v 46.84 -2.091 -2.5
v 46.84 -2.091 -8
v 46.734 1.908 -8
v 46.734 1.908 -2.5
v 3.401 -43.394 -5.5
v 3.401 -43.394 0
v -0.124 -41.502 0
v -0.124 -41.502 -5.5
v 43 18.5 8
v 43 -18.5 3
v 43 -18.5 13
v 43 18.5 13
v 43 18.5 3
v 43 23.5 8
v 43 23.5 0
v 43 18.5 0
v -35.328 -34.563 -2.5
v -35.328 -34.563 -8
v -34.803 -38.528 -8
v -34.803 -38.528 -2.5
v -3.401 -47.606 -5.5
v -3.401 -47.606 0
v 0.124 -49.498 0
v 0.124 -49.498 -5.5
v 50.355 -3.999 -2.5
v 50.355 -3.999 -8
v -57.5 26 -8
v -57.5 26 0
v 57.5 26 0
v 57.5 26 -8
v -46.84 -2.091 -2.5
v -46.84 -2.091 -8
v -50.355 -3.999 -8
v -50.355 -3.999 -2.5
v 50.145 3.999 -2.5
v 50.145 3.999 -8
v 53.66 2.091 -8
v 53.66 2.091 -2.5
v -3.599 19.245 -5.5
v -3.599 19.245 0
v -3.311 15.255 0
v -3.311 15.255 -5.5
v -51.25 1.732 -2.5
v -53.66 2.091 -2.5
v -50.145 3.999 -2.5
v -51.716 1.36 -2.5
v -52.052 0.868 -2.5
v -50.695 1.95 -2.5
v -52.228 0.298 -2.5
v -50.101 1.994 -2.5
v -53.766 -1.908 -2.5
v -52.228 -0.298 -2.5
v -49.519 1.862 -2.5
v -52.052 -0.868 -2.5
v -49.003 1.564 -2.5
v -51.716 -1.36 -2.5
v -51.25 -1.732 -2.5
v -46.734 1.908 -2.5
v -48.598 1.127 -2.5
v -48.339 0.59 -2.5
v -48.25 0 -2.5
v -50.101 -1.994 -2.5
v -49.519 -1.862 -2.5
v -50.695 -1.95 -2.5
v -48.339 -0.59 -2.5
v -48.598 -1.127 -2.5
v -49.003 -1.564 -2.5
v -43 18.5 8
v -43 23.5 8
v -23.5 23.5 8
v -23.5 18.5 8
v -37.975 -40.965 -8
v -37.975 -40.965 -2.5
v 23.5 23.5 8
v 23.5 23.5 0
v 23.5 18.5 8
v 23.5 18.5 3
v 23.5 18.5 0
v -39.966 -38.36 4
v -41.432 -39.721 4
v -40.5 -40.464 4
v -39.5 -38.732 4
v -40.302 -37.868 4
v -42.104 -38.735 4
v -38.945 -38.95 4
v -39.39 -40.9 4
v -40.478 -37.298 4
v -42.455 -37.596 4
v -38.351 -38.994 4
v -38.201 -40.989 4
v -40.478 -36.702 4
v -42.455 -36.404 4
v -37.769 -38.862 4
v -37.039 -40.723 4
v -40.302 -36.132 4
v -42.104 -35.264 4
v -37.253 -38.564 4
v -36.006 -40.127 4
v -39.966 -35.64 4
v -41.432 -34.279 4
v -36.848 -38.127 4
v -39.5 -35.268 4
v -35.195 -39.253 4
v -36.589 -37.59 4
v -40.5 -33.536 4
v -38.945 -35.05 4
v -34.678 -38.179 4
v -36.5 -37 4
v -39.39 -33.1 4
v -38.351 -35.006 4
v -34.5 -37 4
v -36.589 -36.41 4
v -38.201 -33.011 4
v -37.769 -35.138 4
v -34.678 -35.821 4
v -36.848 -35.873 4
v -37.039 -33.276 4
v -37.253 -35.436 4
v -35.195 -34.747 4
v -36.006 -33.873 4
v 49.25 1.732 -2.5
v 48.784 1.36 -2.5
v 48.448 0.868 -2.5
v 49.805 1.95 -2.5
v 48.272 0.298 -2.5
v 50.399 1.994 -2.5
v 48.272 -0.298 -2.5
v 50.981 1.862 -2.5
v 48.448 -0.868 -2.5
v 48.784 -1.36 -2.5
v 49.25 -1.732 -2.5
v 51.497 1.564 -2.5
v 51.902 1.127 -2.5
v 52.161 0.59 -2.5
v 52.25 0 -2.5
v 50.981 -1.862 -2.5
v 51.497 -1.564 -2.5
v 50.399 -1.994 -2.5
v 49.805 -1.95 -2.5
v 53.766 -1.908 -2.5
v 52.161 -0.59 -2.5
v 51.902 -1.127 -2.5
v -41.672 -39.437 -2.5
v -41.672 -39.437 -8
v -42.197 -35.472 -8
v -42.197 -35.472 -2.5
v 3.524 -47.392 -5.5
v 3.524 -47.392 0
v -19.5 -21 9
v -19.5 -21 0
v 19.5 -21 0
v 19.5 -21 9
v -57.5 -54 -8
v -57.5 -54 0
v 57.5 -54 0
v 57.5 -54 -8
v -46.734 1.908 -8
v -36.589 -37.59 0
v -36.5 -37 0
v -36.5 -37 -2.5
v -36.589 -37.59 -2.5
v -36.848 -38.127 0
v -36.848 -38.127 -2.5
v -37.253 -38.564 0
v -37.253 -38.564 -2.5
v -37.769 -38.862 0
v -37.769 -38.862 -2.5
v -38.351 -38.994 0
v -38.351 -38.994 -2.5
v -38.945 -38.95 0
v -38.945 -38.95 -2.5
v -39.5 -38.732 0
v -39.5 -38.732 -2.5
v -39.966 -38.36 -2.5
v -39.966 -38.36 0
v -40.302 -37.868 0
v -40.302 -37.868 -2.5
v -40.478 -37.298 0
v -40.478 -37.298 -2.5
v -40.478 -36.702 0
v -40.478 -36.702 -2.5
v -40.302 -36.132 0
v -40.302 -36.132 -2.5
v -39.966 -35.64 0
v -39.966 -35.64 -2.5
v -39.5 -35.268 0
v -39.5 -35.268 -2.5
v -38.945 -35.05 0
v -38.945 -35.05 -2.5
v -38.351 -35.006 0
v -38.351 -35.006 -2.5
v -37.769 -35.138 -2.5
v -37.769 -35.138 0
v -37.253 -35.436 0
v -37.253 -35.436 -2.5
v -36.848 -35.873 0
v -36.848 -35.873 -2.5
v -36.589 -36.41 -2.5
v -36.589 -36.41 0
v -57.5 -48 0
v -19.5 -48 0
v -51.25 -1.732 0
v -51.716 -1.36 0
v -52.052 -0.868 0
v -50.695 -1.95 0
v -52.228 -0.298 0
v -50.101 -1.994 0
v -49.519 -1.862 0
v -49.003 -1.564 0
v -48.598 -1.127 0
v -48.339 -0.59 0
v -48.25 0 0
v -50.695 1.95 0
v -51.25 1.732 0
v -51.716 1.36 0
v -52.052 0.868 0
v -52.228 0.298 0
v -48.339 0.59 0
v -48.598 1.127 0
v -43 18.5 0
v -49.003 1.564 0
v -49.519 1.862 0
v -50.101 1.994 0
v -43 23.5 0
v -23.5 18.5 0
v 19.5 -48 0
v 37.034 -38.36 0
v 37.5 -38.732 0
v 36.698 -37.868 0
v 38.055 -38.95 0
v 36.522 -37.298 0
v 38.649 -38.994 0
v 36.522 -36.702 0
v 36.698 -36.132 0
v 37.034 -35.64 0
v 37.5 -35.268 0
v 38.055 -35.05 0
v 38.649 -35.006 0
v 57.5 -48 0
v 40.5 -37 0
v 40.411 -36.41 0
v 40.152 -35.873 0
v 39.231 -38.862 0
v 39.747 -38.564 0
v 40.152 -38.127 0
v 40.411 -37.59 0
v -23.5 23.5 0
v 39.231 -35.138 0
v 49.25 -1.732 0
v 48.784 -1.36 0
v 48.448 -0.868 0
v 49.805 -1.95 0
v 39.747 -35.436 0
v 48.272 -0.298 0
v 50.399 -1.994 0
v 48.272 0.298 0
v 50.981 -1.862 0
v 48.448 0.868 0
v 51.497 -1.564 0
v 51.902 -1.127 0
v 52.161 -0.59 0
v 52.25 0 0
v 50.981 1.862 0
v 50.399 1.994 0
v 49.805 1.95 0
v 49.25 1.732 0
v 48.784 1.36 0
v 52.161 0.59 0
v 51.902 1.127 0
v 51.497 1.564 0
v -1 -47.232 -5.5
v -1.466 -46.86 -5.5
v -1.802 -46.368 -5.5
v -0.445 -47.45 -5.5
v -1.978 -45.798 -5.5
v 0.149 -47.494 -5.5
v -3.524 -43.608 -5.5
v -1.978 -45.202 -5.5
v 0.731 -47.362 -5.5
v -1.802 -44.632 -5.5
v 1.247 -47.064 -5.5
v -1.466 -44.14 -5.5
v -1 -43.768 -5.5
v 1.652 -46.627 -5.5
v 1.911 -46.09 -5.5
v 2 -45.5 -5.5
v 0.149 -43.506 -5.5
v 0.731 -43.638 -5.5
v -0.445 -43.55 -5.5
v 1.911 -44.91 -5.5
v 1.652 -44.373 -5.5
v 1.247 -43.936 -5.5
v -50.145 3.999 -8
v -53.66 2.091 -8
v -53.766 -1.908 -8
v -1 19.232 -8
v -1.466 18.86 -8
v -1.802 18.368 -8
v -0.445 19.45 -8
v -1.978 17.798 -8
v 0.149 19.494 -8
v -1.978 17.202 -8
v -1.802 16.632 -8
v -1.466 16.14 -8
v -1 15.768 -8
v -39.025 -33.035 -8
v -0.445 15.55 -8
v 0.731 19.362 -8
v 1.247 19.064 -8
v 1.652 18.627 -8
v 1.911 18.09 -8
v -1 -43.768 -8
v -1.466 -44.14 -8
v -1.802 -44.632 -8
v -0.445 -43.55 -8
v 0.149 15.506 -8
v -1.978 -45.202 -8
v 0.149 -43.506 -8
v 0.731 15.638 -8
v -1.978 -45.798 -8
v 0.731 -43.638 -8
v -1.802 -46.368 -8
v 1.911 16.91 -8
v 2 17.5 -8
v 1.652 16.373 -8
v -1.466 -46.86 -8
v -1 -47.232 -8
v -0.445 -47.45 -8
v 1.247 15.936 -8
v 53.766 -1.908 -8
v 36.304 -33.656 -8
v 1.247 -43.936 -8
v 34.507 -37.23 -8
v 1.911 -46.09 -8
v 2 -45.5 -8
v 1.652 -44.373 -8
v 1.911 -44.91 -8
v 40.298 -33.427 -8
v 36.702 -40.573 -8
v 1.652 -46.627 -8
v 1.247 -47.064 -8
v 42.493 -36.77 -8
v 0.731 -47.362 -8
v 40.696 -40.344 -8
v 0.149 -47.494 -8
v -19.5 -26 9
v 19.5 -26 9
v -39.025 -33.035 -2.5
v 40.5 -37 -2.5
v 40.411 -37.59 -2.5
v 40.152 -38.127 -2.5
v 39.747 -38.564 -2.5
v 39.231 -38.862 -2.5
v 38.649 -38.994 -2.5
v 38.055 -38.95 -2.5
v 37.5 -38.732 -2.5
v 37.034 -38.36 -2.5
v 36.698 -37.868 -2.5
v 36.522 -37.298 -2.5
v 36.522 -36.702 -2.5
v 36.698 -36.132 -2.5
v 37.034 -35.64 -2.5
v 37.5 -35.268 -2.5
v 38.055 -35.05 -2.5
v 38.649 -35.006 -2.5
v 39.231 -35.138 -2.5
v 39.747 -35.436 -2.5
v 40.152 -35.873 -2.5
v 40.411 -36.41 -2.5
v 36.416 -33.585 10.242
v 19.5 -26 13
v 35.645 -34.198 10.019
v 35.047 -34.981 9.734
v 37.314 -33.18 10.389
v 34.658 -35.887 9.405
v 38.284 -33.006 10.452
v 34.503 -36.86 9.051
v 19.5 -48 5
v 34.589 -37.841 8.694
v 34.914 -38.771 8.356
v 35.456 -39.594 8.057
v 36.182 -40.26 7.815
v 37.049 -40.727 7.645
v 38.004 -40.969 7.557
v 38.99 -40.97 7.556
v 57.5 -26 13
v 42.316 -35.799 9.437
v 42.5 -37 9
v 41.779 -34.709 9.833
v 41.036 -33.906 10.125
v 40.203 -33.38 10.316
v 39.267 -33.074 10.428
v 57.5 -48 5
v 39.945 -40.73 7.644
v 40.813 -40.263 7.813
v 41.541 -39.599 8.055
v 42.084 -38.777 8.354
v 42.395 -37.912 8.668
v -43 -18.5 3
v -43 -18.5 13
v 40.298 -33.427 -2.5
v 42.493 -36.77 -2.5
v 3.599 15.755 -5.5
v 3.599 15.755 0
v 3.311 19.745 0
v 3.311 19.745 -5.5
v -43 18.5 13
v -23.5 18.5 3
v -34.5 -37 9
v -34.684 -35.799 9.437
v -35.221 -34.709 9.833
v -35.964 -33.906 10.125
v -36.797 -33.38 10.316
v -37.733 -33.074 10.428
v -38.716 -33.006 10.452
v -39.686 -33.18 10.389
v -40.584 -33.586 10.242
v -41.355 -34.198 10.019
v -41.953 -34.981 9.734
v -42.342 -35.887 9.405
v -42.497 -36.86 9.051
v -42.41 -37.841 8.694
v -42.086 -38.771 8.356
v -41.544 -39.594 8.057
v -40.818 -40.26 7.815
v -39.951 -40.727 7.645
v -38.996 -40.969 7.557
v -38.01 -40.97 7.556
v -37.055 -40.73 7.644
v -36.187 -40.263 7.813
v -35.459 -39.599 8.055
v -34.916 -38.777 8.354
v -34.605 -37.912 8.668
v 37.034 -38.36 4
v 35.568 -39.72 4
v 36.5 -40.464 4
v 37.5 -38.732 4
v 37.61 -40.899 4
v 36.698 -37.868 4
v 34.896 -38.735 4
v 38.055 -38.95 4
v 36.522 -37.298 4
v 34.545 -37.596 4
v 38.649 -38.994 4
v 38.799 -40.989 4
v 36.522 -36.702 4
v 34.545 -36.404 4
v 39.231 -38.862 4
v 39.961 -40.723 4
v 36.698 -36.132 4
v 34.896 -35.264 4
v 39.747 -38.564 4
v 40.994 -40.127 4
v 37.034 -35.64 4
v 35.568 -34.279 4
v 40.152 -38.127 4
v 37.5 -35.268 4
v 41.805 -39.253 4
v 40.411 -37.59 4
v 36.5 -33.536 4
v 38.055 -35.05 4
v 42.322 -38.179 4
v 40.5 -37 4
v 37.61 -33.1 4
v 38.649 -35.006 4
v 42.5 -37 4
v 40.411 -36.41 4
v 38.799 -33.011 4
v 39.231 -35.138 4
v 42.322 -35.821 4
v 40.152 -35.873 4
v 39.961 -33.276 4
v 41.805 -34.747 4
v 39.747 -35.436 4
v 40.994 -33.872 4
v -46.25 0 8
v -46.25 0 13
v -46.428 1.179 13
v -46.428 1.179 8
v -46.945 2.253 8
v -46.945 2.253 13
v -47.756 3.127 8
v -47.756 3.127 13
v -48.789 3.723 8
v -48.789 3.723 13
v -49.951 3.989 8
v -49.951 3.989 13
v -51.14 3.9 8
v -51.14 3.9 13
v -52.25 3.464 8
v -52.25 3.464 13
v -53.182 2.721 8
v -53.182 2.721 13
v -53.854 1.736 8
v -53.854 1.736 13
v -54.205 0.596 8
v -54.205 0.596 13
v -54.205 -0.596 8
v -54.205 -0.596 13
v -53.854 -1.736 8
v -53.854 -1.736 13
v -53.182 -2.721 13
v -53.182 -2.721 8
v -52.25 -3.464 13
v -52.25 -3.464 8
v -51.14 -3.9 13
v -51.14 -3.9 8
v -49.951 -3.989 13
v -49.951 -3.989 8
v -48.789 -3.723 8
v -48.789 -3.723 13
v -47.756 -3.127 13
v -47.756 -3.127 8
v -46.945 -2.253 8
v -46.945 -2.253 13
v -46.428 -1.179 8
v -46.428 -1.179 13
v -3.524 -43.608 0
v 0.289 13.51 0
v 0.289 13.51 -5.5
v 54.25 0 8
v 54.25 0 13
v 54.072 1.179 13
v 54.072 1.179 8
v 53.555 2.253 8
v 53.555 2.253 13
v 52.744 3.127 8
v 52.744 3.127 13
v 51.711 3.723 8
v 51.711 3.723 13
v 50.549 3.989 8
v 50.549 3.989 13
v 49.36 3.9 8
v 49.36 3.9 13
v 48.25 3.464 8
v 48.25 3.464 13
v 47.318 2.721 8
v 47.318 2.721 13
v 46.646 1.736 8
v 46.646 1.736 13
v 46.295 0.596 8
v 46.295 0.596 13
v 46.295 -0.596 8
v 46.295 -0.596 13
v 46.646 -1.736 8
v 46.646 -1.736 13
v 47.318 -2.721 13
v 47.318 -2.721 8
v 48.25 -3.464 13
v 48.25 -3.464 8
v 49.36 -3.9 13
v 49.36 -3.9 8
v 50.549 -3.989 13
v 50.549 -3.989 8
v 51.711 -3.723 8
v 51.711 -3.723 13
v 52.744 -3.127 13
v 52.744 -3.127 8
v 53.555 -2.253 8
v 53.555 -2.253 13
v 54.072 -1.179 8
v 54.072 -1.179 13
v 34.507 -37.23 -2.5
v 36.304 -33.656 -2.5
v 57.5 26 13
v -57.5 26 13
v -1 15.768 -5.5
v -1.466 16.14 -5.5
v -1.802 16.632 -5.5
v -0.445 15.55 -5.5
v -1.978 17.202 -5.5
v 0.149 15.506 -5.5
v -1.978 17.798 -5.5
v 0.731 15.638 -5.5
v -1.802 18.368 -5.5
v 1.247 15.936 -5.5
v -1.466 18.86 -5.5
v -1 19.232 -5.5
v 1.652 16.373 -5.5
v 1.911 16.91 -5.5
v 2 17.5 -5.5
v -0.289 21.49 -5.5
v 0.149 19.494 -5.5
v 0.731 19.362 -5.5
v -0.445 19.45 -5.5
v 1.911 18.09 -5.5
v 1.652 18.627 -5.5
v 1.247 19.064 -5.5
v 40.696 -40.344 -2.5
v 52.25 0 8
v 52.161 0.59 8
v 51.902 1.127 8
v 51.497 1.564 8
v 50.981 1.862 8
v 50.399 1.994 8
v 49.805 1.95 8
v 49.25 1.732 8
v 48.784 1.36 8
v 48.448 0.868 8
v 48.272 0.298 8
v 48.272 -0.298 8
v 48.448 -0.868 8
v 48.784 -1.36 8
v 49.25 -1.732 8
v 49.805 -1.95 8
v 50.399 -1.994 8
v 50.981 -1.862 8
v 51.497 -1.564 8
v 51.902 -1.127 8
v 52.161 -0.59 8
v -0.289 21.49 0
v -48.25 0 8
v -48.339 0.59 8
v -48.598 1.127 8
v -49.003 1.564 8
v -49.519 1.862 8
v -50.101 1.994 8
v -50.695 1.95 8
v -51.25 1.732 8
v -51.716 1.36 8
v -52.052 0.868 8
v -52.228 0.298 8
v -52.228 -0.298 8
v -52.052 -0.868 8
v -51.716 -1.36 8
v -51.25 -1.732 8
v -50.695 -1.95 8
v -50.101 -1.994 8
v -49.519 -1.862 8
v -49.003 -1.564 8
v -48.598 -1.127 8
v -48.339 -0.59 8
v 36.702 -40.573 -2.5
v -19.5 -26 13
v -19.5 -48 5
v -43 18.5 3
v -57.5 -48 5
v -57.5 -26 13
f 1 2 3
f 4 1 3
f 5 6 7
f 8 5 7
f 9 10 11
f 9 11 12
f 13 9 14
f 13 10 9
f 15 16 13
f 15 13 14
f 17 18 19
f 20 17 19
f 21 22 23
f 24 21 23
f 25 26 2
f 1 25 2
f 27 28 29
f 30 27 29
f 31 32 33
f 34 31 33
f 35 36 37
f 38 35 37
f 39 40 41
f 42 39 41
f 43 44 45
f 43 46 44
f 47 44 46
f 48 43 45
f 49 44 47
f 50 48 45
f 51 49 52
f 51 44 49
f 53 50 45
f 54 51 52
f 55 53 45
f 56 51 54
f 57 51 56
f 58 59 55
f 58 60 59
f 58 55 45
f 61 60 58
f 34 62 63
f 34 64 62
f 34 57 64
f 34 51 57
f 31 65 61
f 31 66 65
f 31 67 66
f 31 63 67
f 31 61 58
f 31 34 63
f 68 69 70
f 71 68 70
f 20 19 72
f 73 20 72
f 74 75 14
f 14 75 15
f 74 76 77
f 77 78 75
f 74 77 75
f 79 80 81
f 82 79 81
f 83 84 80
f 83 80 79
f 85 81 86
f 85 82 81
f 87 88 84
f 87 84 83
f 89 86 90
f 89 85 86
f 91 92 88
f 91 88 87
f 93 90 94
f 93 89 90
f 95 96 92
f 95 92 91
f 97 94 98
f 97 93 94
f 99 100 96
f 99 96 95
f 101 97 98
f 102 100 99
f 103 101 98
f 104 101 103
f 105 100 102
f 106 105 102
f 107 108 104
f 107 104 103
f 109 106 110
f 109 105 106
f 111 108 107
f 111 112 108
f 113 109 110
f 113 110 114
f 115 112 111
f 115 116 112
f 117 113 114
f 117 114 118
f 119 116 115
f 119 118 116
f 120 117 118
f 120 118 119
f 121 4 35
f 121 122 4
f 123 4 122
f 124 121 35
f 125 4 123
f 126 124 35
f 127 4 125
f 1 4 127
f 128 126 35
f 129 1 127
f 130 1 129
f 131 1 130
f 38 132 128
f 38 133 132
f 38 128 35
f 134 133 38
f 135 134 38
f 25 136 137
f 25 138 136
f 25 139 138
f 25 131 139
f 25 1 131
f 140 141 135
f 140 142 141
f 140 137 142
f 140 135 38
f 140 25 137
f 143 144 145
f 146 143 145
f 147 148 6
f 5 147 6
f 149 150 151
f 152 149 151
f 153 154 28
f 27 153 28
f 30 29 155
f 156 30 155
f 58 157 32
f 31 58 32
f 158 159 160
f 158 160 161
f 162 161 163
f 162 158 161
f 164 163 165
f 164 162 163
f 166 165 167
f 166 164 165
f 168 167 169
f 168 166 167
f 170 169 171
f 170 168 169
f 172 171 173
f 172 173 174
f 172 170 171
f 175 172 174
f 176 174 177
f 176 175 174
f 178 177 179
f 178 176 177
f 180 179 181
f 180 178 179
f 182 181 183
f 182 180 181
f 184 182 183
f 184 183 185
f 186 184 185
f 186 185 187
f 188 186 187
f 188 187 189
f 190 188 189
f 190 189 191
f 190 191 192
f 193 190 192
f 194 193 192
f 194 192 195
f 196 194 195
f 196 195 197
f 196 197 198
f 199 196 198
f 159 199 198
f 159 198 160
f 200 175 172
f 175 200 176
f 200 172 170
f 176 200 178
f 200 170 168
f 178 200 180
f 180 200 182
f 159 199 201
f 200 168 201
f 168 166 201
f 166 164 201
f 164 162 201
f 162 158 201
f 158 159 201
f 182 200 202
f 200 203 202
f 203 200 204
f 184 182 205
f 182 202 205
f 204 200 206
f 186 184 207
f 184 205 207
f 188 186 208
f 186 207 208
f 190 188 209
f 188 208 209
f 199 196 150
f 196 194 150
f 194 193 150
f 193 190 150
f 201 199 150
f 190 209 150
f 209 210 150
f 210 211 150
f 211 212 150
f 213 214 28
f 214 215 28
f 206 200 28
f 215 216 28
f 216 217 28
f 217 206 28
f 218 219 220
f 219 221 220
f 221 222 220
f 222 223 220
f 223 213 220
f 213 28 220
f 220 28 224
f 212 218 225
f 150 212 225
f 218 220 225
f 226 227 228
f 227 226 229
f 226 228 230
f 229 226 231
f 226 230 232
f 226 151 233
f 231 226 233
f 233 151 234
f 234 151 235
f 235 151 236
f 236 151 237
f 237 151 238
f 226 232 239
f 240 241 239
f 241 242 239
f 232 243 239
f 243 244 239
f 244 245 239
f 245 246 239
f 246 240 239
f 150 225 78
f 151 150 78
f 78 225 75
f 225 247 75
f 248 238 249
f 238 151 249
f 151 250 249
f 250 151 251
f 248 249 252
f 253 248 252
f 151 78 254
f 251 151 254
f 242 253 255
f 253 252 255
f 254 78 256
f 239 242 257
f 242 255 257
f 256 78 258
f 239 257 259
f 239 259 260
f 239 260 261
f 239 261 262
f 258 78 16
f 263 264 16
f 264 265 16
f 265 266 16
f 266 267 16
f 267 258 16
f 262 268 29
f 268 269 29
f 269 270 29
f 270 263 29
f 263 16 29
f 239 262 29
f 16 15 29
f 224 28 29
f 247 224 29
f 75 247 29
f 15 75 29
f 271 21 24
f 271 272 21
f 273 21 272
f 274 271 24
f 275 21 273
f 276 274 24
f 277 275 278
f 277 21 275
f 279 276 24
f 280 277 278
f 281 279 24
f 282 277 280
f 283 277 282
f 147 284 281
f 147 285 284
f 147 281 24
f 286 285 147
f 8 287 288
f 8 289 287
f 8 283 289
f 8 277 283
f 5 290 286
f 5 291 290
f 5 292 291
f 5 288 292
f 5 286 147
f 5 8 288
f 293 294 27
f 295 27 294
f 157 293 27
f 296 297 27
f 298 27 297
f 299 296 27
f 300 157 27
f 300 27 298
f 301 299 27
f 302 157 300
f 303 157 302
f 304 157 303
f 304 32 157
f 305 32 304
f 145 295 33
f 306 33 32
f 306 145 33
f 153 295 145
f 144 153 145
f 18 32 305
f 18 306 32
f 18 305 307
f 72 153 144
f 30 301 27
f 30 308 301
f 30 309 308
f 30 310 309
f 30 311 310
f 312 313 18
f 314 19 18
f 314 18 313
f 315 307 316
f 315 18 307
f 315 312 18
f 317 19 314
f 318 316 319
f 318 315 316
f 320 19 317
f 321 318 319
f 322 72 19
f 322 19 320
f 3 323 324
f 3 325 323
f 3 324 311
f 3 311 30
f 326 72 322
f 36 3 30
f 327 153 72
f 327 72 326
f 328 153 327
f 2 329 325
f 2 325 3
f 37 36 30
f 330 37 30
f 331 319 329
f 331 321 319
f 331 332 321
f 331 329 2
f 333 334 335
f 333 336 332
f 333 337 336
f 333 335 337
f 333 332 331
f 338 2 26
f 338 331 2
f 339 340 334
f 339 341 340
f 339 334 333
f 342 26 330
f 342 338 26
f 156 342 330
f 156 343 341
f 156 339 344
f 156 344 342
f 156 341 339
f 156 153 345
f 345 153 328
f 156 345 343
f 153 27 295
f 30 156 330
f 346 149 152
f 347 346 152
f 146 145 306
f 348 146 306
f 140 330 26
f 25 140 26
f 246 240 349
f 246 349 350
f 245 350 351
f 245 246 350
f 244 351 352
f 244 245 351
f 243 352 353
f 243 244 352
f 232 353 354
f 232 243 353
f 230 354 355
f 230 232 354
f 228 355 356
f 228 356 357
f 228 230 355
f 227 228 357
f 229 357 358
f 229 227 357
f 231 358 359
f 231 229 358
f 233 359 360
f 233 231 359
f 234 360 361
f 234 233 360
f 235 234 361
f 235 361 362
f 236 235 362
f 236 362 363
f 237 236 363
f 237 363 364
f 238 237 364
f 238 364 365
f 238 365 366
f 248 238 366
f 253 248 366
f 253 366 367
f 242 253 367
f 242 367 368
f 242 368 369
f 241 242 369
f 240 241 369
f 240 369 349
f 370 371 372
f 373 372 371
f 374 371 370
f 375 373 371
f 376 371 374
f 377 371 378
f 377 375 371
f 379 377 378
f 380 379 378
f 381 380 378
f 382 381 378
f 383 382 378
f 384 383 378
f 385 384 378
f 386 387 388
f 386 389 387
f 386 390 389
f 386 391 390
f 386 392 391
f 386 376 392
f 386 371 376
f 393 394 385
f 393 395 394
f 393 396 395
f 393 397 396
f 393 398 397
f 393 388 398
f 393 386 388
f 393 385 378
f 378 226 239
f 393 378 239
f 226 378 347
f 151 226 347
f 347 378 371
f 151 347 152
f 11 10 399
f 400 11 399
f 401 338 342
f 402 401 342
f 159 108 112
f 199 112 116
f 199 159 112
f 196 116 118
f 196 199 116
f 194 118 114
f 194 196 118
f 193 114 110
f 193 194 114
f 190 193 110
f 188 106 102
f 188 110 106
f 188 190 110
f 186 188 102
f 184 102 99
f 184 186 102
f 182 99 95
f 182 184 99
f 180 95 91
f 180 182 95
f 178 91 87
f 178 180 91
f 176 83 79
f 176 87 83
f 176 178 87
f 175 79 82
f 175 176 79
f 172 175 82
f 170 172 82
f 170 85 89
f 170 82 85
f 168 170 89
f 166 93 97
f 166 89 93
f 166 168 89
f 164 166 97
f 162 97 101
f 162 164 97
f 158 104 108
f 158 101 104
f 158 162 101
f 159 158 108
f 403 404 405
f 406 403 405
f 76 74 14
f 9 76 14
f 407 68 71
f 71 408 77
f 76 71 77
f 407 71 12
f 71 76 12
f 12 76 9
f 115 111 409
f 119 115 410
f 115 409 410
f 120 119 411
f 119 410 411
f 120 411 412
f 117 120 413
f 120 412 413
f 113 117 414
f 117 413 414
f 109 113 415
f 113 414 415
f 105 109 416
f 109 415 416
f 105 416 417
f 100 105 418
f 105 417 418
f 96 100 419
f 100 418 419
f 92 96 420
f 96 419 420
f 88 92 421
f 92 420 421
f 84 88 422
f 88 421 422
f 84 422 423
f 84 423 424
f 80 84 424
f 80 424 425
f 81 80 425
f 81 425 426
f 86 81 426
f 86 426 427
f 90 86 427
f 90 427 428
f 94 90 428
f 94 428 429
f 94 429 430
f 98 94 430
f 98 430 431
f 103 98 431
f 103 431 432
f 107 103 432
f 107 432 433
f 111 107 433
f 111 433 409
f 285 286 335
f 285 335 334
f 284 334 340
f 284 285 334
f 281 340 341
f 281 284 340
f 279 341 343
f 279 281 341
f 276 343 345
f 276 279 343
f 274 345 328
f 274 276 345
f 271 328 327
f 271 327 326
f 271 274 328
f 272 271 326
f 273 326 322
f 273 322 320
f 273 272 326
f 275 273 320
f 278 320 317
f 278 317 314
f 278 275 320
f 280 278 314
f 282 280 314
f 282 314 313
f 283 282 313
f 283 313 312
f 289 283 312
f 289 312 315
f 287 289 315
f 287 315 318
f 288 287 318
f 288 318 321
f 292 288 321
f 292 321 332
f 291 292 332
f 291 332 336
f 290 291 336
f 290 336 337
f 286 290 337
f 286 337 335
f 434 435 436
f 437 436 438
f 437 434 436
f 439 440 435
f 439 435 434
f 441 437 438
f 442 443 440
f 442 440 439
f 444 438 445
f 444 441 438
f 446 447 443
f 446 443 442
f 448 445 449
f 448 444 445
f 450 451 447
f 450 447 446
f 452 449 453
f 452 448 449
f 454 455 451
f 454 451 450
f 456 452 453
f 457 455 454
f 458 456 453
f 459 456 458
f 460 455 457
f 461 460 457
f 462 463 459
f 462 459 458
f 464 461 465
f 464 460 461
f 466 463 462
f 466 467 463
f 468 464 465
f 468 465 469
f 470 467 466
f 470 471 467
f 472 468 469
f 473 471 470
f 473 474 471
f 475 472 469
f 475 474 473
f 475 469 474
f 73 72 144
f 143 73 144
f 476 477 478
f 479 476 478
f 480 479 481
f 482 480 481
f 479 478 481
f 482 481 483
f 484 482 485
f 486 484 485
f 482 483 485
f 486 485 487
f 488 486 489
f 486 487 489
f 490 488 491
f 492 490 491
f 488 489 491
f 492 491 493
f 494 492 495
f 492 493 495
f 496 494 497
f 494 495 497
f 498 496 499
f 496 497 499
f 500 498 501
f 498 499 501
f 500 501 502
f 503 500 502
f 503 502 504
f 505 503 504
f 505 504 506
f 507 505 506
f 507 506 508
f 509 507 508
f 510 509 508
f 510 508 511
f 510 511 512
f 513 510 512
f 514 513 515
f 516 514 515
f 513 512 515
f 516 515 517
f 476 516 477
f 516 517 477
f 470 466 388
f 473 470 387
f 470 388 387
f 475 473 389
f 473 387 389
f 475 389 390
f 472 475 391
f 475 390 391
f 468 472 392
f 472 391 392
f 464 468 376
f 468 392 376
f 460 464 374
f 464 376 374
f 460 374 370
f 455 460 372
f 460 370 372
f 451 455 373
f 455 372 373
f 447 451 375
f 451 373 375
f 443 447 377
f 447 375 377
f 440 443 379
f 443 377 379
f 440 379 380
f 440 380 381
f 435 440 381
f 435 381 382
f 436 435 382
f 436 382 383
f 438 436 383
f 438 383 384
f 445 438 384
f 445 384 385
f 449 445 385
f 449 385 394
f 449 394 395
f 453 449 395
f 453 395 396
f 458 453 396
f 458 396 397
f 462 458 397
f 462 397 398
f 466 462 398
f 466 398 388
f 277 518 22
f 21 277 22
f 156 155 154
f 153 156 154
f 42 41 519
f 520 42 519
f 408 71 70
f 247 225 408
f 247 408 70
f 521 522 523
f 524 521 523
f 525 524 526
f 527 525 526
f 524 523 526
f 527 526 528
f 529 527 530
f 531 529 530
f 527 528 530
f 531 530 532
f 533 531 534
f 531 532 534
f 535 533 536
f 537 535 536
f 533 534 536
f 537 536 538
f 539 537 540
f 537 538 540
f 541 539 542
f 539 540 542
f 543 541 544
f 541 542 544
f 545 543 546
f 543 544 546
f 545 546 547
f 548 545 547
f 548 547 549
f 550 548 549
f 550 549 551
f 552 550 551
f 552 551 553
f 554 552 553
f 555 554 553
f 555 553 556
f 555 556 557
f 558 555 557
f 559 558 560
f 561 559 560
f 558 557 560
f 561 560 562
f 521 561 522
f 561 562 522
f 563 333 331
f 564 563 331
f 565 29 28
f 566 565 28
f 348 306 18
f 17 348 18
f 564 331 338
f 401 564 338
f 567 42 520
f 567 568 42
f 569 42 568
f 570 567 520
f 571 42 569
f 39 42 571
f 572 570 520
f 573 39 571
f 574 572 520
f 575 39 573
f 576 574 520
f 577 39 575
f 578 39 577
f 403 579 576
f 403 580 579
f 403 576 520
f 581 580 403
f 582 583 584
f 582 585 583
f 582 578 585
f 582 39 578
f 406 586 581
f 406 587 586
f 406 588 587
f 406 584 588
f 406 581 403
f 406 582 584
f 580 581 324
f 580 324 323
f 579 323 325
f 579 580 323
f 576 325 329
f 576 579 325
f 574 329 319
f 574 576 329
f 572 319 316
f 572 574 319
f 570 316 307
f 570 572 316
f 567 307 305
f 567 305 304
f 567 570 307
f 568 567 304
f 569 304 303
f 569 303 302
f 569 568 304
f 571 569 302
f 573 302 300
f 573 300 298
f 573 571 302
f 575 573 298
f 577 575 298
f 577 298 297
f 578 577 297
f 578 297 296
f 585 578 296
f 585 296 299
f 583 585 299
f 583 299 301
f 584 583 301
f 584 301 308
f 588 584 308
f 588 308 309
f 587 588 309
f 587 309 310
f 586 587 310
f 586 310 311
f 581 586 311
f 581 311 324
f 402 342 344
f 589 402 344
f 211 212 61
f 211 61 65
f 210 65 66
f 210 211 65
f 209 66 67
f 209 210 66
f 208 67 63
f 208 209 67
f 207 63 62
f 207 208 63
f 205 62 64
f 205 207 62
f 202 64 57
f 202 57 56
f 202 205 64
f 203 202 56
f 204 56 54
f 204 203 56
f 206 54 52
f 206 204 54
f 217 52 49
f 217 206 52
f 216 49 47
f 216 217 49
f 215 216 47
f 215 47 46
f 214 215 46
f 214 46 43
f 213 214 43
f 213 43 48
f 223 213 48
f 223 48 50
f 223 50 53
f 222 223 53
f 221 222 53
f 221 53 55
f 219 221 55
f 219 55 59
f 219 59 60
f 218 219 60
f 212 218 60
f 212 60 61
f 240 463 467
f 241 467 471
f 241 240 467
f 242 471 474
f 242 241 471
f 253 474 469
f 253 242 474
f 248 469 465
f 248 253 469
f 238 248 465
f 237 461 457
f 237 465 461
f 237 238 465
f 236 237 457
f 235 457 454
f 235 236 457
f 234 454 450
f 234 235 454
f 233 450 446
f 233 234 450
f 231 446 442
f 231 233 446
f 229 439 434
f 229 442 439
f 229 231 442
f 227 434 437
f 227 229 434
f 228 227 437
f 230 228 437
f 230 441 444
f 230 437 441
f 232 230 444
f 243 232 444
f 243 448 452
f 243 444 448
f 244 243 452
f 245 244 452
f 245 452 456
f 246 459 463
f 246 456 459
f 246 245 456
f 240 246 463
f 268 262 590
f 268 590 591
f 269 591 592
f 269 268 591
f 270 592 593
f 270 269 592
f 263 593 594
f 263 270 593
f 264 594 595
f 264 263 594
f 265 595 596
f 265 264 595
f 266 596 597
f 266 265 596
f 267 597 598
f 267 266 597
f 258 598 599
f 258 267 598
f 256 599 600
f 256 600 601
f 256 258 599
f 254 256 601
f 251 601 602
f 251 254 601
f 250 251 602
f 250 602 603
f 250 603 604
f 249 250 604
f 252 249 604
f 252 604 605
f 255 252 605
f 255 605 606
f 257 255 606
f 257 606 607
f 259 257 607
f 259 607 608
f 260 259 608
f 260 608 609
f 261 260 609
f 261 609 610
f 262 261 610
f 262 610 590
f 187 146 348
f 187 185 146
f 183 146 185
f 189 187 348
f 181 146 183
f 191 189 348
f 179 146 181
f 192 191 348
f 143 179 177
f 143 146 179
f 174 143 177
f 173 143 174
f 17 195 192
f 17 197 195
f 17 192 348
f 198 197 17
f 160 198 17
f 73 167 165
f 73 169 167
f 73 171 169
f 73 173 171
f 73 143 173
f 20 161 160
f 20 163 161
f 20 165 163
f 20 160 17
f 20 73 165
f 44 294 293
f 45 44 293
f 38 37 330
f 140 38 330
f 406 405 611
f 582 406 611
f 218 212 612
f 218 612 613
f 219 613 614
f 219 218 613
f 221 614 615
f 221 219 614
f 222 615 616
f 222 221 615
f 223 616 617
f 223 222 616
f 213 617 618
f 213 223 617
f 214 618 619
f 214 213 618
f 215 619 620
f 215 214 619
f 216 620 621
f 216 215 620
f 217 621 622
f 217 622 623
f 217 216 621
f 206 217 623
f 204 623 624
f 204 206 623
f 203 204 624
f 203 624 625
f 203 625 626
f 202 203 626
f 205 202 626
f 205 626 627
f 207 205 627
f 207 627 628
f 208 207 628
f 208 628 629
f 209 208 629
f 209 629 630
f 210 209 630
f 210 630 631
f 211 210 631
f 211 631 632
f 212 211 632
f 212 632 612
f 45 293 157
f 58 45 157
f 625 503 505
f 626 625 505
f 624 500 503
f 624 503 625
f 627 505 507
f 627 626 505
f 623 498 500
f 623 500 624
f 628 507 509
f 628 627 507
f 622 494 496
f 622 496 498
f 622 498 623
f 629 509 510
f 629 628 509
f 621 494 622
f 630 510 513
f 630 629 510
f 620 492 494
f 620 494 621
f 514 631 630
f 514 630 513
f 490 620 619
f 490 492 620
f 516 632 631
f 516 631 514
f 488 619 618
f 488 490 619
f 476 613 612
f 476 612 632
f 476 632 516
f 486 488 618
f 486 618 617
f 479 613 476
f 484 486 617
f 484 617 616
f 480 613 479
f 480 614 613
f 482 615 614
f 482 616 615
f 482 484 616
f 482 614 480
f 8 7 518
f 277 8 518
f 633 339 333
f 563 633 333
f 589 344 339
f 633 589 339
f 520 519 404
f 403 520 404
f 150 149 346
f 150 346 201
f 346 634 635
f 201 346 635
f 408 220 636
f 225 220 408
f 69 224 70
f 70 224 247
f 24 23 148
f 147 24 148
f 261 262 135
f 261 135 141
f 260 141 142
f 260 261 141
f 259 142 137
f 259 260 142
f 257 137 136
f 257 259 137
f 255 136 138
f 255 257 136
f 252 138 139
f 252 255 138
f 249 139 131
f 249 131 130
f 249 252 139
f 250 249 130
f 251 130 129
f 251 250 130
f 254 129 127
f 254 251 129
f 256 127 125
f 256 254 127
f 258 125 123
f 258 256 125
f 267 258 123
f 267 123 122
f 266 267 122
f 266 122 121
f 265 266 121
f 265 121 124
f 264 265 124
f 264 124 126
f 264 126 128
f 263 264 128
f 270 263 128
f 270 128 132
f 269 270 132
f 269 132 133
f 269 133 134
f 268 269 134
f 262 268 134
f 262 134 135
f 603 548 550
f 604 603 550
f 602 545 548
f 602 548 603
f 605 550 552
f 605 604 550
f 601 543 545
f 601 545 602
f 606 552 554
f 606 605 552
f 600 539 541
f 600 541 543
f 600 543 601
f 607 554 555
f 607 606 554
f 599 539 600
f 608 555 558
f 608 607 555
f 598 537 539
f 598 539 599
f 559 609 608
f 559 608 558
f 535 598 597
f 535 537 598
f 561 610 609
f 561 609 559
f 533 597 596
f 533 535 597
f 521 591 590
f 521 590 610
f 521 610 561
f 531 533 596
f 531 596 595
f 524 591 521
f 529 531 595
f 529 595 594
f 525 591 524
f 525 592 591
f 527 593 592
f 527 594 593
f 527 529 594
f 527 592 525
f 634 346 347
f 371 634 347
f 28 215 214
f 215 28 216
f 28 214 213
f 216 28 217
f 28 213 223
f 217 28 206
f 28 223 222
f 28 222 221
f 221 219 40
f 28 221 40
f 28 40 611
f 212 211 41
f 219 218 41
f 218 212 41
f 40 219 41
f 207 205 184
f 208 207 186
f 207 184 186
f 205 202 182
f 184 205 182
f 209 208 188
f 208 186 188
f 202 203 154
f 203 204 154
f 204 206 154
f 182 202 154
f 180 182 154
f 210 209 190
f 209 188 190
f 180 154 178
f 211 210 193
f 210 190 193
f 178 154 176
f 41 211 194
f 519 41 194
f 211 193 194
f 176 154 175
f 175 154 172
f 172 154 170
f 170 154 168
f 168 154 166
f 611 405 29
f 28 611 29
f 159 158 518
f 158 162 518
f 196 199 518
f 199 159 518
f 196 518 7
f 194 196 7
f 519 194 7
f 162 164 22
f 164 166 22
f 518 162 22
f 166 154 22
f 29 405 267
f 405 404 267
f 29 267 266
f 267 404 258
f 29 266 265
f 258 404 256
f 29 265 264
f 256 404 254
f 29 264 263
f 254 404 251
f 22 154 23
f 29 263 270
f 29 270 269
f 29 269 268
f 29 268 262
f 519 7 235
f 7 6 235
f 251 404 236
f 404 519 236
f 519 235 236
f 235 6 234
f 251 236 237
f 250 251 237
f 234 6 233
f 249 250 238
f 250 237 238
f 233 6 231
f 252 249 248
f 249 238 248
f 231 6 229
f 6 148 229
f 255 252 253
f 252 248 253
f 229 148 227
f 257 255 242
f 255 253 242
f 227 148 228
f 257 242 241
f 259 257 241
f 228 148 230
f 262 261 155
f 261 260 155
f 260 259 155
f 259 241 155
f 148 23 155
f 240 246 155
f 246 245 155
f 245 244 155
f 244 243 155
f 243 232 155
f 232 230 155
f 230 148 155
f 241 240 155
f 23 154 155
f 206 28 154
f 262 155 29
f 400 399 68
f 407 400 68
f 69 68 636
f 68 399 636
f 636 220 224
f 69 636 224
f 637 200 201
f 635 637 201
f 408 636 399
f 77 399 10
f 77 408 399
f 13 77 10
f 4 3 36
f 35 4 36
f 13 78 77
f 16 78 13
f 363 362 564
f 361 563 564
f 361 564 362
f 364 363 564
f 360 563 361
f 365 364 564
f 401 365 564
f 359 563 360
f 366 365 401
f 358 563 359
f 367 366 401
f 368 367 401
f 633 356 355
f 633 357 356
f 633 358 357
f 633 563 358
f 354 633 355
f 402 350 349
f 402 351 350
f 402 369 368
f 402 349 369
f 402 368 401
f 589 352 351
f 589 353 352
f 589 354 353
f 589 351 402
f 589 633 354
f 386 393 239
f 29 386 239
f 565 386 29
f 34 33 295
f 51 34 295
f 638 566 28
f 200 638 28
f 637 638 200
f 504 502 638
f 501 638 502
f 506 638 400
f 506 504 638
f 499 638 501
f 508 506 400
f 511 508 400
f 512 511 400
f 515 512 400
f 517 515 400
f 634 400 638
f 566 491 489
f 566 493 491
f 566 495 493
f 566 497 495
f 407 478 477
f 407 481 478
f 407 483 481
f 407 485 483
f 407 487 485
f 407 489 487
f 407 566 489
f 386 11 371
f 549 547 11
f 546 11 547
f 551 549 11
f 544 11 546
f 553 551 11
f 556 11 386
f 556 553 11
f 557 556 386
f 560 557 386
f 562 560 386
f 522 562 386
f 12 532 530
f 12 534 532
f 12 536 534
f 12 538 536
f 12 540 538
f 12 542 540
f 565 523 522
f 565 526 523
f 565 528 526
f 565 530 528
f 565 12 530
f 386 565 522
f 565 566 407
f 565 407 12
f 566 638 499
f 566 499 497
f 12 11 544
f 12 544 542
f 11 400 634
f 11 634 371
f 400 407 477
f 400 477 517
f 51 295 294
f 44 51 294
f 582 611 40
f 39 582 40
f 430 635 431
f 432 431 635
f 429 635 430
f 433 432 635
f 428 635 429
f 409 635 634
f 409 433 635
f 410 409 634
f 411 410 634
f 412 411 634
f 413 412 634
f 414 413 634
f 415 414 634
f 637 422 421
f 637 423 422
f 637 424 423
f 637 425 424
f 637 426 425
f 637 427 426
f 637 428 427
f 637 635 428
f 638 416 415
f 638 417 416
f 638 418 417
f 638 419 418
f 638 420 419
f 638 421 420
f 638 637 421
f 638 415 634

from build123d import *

# Parameters (mm, degrees)
F0_R      = 4
F0_R_2    = 2
F0_W      = 19.5
F0_H      = 5
F0_W_2    = 39
F1_DEPTH  = 13
F2_DEPTH  = 3
F3_DEPTH  = 8
F0_W_3    = 38
F0_H_2    = 22
F4_DEPTH  = 5
F5_DEPTH  = 9
F7_DEPTH  = 38
F9_DEPTH  = 38
F10_R     = 4
F10_R_2   = 2
F11_DEPTH = 5
F12_DEPTH = 25
F13_DEPTH = 9
F14_R     = 2
F14_W     = 19.5
F14_H     = 5
F15_DEPTH = 8
F16_R     = 2
F17_DEPTH = 5.5
F18_R     = 2
F19_DEPTH = 5.5


with BuildPart() as f1:
    # F0 (on Top) → F1 (new body)
    with BuildSketch(Plane.XY):
        Polygon((19.5, -26), (57.5, -26), (57.5, 26), (-57.5, 26), (-57.5, -26), (-19.5, -26), (-19.5, -21), (19.5, -21), align=None)
        with Locations((-50.25, 0)):
            Circle(F0_R, mode=Mode.SUBTRACT)
        Polygon((43, 18.5), (43, -18.5), (-43, -18.5), (-43, 18.5), (-43, 23.5), (-23.5, 23.5), (-23.5, 18.5), (23.5, 18.5), (23.5, 23.5), (43, 23.5), align=None, mode=Mode.SUBTRACT)
        with Locations((50.25, 0)):
            Circle(F0_R, mode=Mode.SUBTRACT)
        with Locations((-50.25, 0)):
            Circle(F0_R)
        with Locations((-50.25, 0)):
            Circle(F0_R_2, mode=Mode.SUBTRACT)
        with Locations((50.25, 0)):
            Circle(F0_R)
        with Locations((50.25, 0)):
            Circle(F0_R_2, mode=Mode.SUBTRACT)
        with Locations((-33.25, 21)):
            Rectangle(F0_W, F0_H)
        with Locations((33.25, 21)):
            Rectangle(F0_W, F0_H)
        with Locations((0, -23.5)):
            Rectangle(F0_W_2, F0_H)
    extrude(amount=F1_DEPTH)

    # F0 (on Top) → F2 (join)
    with BuildSketch(Plane.XY):
        Polygon((-43, -18.5), (43, -18.5), (43, 18.5), (23.5, 18.5), (-23.5, 18.5), (-43, 18.5), align=None)
    extrude(amount=F2_DEPTH)

    # F0 (on Top) → F3 (cut)
    with BuildSketch(Plane.XY):
        with Locations((-33.25, 21)):
            Rectangle(F0_W, F0_H)
        with Locations((33.25, 21)):
            Rectangle(F0_W, F0_H)
    extrude(amount=F3_DEPTH, mode=Mode.SUBTRACT)

    # F0 (on Top) → F4 (join)
    with BuildSketch(Plane.XY):
        with Locations((-38.5, -37)):
            Rectangle(F0_W_3, F0_H_2)
        with Locations((-38.5, -37)):
            Circle(F0_R, mode=Mode.SUBTRACT)
        with Locations((-38.5, -37)):
            Circle(F0_R)
        with Locations((-38.5, -37)):
            Circle(F0_R_2, mode=Mode.SUBTRACT)
        with Locations((38.5, -37)):
            Rectangle(F0_W_3, F0_H_2)
        with Locations((38.5, -37)):
            Circle(F0_R, mode=Mode.SUBTRACT)
        with Locations((38.5, -37)):
            Circle(F0_R)
        with Locations((38.5, -37)):
            Circle(F0_R_2, mode=Mode.SUBTRACT)
    extrude(amount=F4_DEPTH)

    # F0 (on Top) → F5 (cut)
    with BuildSketch(Plane.XY):
        with Locations((0, -23.5)):
            Rectangle(F0_W_2, F0_H)
    extrude(amount=F5_DEPTH, mode=Mode.SUBTRACT)

    # F6 (on face) → F7 (join)
    with BuildSketch(Plane.YZ.offset(57.5)):
        Polygon((-26, 5), (-26, 13), (-48, 5), align=None)
    extrude(amount=-F7_DEPTH)

    # F8 (on face) → F9 (join)
    with BuildSketch(Plane(origin=(-57.5, 0, 0), x_dir=(0, -1, 0), z_dir=(-1, 0, 0))):
        Polygon((48, 5), (26, 13), (26, 5), align=None)
    extrude(amount=-F9_DEPTH)

    # F10 (on face) → F11 (cut)
    with BuildSketch(Plane.XY.offset(13)):
        with Locations((-50.25, 0)):
            Circle(F10_R)
        with Locations((-50.25, 0)):
            Circle(F10_R_2, mode=Mode.SUBTRACT)
        with Locations((50.25, 0)):
            Circle(F10_R)
        with Locations((50.25, 0)):
            Circle(F10_R_2, mode=Mode.SUBTRACT)
    extrude(amount=-F11_DEPTH, mode=Mode.SUBTRACT)

    # F0 (on Top) → F12 (cut)
    with BuildSketch(Plane.XY):
        with Locations((38.5, -37)):
            Circle(F0_R_2)
        with Locations((-38.5, -37)):
            Circle(F0_R_2)
    extrude(amount=F12_DEPTH, mode=Mode.SUBTRACT)

    # F10 (on face) → F13 (cut)
    with BuildSketch(Plane.XY.offset(13)):
        with Locations((-38.4998954833, -36.9998440146)):
            Circle(F10_R)
        with Locations((38.5000556707, -36.9997806847)):
            Circle(F10_R)
    extrude(amount=-F13_DEPTH, mode=Mode.SUBTRACT)


with BuildPart() as f15:
    # F14 (on face) → F15 (new body)
    with BuildSketch(Plane(origin=(0, 0, 0), x_dir=(1, 0, 0), z_dir=(0, 0, -1))):
        Polygon((19.5, 48), (57.5, 48), (57.5, 54), (-57.5, 54), (-57.5, 48), (-19.5, 48), (-19.5, 21), (19.5, 21), align=None)
        with Locations((0, 45.5)):
            Circle(F14_R, mode=Mode.SUBTRACT)
        Polygon((-57.5, -26), (57.5, -26), (57.5, 48), (19.5, 48), (19.5, 21), (-19.5, 21), (-19.5, 48), (-57.5, 48), align=None)
        with Locations((-33.25, -21)):
            Rectangle(F14_W, F14_H, mode=Mode.SUBTRACT)
        with Locations((-50.25, 0)):
            Circle(F14_R, mode=Mode.SUBTRACT)
        with Locations((0, -17.5)):
            Circle(F14_R, mode=Mode.SUBTRACT)
        with Locations((33.25, -21)):
            Rectangle(F14_W, F14_H, mode=Mode.SUBTRACT)
        with Locations((50.25, 0)):
            Circle(F14_R, mode=Mode.SUBTRACT)
        with Locations((-38.5, 37)):
            Circle(F14_R, mode=Mode.SUBTRACT)
        with Locations((38.5, 37)):
            Circle(F14_R, mode=Mode.SUBTRACT)
        with Locations((33.25, -21)):
            Rectangle(F14_W, F14_H)
        with Locations((-33.25, -21)):
            Rectangle(F14_W, F14_H)
    extrude(amount=F15_DEPTH)

    # F16 (on face) → F17 (cut)
    with BuildSketch(Plane.XY):
        Polygon((0.288539231, 13.5104204342), (3.5993468699, 15.7550925211), (3.310807639, 19.7446720869), (-0.288539231, 21.4895795658), (-3.5993468699, 19.2449074789), (-3.310807639, 15.2553279131), align=None)
        with Locations((0, 17.5)):
            Circle(F16_R, mode=Mode.SUBTRACT)
        Polygon((0.1236368048, -49.498088786), (3.5242648576, -47.3919717792), (3.4006280528, -43.3938829932), (-0.1236368048, -41.501911214), (-3.5242648576, -43.6080282208), (-3.4006280528, -47.6061170068), align=None)
        with Locations((0, -45.5)):
            Circle(F16_R, mode=Mode.SUBTRACT)
    extrude(amount=-F17_DEPTH, mode=Mode.SUBTRACT)

    # F18 (on face) → F19 (cut)
    with BuildSketch(Plane(origin=(0, 0, -8), x_dir=(1, 0, 0), z_dir=(0, 0, -1))):
        Polygon((-39.0249456513, 33.034595599), (-35.3283318782, 34.5626815299), (-34.8033862268, 38.5280859308), (-37.9750543487, 40.965404401), (-41.6716681218, 39.4373184701), (-42.1966137732, 35.4719140692), align=None)
        with Locations((-38.5, 37)):
            Circle(F18_R, mode=Mode.SUBTRACT)
        Polygon((34.5065976223, 37.2296463585), (36.3044192308, 33.6564352726), (40.2978216085, 33.4267889142), (42.4934023777, 36.7703536415), (40.6955807692, 40.3435647274), (36.7021783915, 40.5732110858), align=None)
        with Locations((38.5, 37)):
            Circle(F18_R, mode=Mode.SUBTRACT)
        Polygon((46.8398287902, 2.0906296468), (46.7343760111, -1.9079800755), (50.1445472208, -3.9986097223), (53.6601712098, -2.0906296468), (53.7656239889, 1.9079800755), (50.3554527792, 3.9986097223), align=None)
        with Locations((50.25, 0)):
            Circle(F18_R, mode=Mode.SUBTRACT)
        Polygon((-50.1445472208, -3.9986097223), (-46.7343760111, -1.9079800755), (-46.8398287902, 2.0906296468), (-50.3554527792, 3.9986097223), (-53.7656239889, 1.9079800755), (-53.6601712098, -2.0906296468), align=None)
        with Locations((-50.25, 0)):
            Circle(F18_R, mode=Mode.SUBTRACT)
    extrude(amount=-F19_DEPTH, mode=Mode.SUBTRACT)


solid = Compound([f1.part, f15.part])
